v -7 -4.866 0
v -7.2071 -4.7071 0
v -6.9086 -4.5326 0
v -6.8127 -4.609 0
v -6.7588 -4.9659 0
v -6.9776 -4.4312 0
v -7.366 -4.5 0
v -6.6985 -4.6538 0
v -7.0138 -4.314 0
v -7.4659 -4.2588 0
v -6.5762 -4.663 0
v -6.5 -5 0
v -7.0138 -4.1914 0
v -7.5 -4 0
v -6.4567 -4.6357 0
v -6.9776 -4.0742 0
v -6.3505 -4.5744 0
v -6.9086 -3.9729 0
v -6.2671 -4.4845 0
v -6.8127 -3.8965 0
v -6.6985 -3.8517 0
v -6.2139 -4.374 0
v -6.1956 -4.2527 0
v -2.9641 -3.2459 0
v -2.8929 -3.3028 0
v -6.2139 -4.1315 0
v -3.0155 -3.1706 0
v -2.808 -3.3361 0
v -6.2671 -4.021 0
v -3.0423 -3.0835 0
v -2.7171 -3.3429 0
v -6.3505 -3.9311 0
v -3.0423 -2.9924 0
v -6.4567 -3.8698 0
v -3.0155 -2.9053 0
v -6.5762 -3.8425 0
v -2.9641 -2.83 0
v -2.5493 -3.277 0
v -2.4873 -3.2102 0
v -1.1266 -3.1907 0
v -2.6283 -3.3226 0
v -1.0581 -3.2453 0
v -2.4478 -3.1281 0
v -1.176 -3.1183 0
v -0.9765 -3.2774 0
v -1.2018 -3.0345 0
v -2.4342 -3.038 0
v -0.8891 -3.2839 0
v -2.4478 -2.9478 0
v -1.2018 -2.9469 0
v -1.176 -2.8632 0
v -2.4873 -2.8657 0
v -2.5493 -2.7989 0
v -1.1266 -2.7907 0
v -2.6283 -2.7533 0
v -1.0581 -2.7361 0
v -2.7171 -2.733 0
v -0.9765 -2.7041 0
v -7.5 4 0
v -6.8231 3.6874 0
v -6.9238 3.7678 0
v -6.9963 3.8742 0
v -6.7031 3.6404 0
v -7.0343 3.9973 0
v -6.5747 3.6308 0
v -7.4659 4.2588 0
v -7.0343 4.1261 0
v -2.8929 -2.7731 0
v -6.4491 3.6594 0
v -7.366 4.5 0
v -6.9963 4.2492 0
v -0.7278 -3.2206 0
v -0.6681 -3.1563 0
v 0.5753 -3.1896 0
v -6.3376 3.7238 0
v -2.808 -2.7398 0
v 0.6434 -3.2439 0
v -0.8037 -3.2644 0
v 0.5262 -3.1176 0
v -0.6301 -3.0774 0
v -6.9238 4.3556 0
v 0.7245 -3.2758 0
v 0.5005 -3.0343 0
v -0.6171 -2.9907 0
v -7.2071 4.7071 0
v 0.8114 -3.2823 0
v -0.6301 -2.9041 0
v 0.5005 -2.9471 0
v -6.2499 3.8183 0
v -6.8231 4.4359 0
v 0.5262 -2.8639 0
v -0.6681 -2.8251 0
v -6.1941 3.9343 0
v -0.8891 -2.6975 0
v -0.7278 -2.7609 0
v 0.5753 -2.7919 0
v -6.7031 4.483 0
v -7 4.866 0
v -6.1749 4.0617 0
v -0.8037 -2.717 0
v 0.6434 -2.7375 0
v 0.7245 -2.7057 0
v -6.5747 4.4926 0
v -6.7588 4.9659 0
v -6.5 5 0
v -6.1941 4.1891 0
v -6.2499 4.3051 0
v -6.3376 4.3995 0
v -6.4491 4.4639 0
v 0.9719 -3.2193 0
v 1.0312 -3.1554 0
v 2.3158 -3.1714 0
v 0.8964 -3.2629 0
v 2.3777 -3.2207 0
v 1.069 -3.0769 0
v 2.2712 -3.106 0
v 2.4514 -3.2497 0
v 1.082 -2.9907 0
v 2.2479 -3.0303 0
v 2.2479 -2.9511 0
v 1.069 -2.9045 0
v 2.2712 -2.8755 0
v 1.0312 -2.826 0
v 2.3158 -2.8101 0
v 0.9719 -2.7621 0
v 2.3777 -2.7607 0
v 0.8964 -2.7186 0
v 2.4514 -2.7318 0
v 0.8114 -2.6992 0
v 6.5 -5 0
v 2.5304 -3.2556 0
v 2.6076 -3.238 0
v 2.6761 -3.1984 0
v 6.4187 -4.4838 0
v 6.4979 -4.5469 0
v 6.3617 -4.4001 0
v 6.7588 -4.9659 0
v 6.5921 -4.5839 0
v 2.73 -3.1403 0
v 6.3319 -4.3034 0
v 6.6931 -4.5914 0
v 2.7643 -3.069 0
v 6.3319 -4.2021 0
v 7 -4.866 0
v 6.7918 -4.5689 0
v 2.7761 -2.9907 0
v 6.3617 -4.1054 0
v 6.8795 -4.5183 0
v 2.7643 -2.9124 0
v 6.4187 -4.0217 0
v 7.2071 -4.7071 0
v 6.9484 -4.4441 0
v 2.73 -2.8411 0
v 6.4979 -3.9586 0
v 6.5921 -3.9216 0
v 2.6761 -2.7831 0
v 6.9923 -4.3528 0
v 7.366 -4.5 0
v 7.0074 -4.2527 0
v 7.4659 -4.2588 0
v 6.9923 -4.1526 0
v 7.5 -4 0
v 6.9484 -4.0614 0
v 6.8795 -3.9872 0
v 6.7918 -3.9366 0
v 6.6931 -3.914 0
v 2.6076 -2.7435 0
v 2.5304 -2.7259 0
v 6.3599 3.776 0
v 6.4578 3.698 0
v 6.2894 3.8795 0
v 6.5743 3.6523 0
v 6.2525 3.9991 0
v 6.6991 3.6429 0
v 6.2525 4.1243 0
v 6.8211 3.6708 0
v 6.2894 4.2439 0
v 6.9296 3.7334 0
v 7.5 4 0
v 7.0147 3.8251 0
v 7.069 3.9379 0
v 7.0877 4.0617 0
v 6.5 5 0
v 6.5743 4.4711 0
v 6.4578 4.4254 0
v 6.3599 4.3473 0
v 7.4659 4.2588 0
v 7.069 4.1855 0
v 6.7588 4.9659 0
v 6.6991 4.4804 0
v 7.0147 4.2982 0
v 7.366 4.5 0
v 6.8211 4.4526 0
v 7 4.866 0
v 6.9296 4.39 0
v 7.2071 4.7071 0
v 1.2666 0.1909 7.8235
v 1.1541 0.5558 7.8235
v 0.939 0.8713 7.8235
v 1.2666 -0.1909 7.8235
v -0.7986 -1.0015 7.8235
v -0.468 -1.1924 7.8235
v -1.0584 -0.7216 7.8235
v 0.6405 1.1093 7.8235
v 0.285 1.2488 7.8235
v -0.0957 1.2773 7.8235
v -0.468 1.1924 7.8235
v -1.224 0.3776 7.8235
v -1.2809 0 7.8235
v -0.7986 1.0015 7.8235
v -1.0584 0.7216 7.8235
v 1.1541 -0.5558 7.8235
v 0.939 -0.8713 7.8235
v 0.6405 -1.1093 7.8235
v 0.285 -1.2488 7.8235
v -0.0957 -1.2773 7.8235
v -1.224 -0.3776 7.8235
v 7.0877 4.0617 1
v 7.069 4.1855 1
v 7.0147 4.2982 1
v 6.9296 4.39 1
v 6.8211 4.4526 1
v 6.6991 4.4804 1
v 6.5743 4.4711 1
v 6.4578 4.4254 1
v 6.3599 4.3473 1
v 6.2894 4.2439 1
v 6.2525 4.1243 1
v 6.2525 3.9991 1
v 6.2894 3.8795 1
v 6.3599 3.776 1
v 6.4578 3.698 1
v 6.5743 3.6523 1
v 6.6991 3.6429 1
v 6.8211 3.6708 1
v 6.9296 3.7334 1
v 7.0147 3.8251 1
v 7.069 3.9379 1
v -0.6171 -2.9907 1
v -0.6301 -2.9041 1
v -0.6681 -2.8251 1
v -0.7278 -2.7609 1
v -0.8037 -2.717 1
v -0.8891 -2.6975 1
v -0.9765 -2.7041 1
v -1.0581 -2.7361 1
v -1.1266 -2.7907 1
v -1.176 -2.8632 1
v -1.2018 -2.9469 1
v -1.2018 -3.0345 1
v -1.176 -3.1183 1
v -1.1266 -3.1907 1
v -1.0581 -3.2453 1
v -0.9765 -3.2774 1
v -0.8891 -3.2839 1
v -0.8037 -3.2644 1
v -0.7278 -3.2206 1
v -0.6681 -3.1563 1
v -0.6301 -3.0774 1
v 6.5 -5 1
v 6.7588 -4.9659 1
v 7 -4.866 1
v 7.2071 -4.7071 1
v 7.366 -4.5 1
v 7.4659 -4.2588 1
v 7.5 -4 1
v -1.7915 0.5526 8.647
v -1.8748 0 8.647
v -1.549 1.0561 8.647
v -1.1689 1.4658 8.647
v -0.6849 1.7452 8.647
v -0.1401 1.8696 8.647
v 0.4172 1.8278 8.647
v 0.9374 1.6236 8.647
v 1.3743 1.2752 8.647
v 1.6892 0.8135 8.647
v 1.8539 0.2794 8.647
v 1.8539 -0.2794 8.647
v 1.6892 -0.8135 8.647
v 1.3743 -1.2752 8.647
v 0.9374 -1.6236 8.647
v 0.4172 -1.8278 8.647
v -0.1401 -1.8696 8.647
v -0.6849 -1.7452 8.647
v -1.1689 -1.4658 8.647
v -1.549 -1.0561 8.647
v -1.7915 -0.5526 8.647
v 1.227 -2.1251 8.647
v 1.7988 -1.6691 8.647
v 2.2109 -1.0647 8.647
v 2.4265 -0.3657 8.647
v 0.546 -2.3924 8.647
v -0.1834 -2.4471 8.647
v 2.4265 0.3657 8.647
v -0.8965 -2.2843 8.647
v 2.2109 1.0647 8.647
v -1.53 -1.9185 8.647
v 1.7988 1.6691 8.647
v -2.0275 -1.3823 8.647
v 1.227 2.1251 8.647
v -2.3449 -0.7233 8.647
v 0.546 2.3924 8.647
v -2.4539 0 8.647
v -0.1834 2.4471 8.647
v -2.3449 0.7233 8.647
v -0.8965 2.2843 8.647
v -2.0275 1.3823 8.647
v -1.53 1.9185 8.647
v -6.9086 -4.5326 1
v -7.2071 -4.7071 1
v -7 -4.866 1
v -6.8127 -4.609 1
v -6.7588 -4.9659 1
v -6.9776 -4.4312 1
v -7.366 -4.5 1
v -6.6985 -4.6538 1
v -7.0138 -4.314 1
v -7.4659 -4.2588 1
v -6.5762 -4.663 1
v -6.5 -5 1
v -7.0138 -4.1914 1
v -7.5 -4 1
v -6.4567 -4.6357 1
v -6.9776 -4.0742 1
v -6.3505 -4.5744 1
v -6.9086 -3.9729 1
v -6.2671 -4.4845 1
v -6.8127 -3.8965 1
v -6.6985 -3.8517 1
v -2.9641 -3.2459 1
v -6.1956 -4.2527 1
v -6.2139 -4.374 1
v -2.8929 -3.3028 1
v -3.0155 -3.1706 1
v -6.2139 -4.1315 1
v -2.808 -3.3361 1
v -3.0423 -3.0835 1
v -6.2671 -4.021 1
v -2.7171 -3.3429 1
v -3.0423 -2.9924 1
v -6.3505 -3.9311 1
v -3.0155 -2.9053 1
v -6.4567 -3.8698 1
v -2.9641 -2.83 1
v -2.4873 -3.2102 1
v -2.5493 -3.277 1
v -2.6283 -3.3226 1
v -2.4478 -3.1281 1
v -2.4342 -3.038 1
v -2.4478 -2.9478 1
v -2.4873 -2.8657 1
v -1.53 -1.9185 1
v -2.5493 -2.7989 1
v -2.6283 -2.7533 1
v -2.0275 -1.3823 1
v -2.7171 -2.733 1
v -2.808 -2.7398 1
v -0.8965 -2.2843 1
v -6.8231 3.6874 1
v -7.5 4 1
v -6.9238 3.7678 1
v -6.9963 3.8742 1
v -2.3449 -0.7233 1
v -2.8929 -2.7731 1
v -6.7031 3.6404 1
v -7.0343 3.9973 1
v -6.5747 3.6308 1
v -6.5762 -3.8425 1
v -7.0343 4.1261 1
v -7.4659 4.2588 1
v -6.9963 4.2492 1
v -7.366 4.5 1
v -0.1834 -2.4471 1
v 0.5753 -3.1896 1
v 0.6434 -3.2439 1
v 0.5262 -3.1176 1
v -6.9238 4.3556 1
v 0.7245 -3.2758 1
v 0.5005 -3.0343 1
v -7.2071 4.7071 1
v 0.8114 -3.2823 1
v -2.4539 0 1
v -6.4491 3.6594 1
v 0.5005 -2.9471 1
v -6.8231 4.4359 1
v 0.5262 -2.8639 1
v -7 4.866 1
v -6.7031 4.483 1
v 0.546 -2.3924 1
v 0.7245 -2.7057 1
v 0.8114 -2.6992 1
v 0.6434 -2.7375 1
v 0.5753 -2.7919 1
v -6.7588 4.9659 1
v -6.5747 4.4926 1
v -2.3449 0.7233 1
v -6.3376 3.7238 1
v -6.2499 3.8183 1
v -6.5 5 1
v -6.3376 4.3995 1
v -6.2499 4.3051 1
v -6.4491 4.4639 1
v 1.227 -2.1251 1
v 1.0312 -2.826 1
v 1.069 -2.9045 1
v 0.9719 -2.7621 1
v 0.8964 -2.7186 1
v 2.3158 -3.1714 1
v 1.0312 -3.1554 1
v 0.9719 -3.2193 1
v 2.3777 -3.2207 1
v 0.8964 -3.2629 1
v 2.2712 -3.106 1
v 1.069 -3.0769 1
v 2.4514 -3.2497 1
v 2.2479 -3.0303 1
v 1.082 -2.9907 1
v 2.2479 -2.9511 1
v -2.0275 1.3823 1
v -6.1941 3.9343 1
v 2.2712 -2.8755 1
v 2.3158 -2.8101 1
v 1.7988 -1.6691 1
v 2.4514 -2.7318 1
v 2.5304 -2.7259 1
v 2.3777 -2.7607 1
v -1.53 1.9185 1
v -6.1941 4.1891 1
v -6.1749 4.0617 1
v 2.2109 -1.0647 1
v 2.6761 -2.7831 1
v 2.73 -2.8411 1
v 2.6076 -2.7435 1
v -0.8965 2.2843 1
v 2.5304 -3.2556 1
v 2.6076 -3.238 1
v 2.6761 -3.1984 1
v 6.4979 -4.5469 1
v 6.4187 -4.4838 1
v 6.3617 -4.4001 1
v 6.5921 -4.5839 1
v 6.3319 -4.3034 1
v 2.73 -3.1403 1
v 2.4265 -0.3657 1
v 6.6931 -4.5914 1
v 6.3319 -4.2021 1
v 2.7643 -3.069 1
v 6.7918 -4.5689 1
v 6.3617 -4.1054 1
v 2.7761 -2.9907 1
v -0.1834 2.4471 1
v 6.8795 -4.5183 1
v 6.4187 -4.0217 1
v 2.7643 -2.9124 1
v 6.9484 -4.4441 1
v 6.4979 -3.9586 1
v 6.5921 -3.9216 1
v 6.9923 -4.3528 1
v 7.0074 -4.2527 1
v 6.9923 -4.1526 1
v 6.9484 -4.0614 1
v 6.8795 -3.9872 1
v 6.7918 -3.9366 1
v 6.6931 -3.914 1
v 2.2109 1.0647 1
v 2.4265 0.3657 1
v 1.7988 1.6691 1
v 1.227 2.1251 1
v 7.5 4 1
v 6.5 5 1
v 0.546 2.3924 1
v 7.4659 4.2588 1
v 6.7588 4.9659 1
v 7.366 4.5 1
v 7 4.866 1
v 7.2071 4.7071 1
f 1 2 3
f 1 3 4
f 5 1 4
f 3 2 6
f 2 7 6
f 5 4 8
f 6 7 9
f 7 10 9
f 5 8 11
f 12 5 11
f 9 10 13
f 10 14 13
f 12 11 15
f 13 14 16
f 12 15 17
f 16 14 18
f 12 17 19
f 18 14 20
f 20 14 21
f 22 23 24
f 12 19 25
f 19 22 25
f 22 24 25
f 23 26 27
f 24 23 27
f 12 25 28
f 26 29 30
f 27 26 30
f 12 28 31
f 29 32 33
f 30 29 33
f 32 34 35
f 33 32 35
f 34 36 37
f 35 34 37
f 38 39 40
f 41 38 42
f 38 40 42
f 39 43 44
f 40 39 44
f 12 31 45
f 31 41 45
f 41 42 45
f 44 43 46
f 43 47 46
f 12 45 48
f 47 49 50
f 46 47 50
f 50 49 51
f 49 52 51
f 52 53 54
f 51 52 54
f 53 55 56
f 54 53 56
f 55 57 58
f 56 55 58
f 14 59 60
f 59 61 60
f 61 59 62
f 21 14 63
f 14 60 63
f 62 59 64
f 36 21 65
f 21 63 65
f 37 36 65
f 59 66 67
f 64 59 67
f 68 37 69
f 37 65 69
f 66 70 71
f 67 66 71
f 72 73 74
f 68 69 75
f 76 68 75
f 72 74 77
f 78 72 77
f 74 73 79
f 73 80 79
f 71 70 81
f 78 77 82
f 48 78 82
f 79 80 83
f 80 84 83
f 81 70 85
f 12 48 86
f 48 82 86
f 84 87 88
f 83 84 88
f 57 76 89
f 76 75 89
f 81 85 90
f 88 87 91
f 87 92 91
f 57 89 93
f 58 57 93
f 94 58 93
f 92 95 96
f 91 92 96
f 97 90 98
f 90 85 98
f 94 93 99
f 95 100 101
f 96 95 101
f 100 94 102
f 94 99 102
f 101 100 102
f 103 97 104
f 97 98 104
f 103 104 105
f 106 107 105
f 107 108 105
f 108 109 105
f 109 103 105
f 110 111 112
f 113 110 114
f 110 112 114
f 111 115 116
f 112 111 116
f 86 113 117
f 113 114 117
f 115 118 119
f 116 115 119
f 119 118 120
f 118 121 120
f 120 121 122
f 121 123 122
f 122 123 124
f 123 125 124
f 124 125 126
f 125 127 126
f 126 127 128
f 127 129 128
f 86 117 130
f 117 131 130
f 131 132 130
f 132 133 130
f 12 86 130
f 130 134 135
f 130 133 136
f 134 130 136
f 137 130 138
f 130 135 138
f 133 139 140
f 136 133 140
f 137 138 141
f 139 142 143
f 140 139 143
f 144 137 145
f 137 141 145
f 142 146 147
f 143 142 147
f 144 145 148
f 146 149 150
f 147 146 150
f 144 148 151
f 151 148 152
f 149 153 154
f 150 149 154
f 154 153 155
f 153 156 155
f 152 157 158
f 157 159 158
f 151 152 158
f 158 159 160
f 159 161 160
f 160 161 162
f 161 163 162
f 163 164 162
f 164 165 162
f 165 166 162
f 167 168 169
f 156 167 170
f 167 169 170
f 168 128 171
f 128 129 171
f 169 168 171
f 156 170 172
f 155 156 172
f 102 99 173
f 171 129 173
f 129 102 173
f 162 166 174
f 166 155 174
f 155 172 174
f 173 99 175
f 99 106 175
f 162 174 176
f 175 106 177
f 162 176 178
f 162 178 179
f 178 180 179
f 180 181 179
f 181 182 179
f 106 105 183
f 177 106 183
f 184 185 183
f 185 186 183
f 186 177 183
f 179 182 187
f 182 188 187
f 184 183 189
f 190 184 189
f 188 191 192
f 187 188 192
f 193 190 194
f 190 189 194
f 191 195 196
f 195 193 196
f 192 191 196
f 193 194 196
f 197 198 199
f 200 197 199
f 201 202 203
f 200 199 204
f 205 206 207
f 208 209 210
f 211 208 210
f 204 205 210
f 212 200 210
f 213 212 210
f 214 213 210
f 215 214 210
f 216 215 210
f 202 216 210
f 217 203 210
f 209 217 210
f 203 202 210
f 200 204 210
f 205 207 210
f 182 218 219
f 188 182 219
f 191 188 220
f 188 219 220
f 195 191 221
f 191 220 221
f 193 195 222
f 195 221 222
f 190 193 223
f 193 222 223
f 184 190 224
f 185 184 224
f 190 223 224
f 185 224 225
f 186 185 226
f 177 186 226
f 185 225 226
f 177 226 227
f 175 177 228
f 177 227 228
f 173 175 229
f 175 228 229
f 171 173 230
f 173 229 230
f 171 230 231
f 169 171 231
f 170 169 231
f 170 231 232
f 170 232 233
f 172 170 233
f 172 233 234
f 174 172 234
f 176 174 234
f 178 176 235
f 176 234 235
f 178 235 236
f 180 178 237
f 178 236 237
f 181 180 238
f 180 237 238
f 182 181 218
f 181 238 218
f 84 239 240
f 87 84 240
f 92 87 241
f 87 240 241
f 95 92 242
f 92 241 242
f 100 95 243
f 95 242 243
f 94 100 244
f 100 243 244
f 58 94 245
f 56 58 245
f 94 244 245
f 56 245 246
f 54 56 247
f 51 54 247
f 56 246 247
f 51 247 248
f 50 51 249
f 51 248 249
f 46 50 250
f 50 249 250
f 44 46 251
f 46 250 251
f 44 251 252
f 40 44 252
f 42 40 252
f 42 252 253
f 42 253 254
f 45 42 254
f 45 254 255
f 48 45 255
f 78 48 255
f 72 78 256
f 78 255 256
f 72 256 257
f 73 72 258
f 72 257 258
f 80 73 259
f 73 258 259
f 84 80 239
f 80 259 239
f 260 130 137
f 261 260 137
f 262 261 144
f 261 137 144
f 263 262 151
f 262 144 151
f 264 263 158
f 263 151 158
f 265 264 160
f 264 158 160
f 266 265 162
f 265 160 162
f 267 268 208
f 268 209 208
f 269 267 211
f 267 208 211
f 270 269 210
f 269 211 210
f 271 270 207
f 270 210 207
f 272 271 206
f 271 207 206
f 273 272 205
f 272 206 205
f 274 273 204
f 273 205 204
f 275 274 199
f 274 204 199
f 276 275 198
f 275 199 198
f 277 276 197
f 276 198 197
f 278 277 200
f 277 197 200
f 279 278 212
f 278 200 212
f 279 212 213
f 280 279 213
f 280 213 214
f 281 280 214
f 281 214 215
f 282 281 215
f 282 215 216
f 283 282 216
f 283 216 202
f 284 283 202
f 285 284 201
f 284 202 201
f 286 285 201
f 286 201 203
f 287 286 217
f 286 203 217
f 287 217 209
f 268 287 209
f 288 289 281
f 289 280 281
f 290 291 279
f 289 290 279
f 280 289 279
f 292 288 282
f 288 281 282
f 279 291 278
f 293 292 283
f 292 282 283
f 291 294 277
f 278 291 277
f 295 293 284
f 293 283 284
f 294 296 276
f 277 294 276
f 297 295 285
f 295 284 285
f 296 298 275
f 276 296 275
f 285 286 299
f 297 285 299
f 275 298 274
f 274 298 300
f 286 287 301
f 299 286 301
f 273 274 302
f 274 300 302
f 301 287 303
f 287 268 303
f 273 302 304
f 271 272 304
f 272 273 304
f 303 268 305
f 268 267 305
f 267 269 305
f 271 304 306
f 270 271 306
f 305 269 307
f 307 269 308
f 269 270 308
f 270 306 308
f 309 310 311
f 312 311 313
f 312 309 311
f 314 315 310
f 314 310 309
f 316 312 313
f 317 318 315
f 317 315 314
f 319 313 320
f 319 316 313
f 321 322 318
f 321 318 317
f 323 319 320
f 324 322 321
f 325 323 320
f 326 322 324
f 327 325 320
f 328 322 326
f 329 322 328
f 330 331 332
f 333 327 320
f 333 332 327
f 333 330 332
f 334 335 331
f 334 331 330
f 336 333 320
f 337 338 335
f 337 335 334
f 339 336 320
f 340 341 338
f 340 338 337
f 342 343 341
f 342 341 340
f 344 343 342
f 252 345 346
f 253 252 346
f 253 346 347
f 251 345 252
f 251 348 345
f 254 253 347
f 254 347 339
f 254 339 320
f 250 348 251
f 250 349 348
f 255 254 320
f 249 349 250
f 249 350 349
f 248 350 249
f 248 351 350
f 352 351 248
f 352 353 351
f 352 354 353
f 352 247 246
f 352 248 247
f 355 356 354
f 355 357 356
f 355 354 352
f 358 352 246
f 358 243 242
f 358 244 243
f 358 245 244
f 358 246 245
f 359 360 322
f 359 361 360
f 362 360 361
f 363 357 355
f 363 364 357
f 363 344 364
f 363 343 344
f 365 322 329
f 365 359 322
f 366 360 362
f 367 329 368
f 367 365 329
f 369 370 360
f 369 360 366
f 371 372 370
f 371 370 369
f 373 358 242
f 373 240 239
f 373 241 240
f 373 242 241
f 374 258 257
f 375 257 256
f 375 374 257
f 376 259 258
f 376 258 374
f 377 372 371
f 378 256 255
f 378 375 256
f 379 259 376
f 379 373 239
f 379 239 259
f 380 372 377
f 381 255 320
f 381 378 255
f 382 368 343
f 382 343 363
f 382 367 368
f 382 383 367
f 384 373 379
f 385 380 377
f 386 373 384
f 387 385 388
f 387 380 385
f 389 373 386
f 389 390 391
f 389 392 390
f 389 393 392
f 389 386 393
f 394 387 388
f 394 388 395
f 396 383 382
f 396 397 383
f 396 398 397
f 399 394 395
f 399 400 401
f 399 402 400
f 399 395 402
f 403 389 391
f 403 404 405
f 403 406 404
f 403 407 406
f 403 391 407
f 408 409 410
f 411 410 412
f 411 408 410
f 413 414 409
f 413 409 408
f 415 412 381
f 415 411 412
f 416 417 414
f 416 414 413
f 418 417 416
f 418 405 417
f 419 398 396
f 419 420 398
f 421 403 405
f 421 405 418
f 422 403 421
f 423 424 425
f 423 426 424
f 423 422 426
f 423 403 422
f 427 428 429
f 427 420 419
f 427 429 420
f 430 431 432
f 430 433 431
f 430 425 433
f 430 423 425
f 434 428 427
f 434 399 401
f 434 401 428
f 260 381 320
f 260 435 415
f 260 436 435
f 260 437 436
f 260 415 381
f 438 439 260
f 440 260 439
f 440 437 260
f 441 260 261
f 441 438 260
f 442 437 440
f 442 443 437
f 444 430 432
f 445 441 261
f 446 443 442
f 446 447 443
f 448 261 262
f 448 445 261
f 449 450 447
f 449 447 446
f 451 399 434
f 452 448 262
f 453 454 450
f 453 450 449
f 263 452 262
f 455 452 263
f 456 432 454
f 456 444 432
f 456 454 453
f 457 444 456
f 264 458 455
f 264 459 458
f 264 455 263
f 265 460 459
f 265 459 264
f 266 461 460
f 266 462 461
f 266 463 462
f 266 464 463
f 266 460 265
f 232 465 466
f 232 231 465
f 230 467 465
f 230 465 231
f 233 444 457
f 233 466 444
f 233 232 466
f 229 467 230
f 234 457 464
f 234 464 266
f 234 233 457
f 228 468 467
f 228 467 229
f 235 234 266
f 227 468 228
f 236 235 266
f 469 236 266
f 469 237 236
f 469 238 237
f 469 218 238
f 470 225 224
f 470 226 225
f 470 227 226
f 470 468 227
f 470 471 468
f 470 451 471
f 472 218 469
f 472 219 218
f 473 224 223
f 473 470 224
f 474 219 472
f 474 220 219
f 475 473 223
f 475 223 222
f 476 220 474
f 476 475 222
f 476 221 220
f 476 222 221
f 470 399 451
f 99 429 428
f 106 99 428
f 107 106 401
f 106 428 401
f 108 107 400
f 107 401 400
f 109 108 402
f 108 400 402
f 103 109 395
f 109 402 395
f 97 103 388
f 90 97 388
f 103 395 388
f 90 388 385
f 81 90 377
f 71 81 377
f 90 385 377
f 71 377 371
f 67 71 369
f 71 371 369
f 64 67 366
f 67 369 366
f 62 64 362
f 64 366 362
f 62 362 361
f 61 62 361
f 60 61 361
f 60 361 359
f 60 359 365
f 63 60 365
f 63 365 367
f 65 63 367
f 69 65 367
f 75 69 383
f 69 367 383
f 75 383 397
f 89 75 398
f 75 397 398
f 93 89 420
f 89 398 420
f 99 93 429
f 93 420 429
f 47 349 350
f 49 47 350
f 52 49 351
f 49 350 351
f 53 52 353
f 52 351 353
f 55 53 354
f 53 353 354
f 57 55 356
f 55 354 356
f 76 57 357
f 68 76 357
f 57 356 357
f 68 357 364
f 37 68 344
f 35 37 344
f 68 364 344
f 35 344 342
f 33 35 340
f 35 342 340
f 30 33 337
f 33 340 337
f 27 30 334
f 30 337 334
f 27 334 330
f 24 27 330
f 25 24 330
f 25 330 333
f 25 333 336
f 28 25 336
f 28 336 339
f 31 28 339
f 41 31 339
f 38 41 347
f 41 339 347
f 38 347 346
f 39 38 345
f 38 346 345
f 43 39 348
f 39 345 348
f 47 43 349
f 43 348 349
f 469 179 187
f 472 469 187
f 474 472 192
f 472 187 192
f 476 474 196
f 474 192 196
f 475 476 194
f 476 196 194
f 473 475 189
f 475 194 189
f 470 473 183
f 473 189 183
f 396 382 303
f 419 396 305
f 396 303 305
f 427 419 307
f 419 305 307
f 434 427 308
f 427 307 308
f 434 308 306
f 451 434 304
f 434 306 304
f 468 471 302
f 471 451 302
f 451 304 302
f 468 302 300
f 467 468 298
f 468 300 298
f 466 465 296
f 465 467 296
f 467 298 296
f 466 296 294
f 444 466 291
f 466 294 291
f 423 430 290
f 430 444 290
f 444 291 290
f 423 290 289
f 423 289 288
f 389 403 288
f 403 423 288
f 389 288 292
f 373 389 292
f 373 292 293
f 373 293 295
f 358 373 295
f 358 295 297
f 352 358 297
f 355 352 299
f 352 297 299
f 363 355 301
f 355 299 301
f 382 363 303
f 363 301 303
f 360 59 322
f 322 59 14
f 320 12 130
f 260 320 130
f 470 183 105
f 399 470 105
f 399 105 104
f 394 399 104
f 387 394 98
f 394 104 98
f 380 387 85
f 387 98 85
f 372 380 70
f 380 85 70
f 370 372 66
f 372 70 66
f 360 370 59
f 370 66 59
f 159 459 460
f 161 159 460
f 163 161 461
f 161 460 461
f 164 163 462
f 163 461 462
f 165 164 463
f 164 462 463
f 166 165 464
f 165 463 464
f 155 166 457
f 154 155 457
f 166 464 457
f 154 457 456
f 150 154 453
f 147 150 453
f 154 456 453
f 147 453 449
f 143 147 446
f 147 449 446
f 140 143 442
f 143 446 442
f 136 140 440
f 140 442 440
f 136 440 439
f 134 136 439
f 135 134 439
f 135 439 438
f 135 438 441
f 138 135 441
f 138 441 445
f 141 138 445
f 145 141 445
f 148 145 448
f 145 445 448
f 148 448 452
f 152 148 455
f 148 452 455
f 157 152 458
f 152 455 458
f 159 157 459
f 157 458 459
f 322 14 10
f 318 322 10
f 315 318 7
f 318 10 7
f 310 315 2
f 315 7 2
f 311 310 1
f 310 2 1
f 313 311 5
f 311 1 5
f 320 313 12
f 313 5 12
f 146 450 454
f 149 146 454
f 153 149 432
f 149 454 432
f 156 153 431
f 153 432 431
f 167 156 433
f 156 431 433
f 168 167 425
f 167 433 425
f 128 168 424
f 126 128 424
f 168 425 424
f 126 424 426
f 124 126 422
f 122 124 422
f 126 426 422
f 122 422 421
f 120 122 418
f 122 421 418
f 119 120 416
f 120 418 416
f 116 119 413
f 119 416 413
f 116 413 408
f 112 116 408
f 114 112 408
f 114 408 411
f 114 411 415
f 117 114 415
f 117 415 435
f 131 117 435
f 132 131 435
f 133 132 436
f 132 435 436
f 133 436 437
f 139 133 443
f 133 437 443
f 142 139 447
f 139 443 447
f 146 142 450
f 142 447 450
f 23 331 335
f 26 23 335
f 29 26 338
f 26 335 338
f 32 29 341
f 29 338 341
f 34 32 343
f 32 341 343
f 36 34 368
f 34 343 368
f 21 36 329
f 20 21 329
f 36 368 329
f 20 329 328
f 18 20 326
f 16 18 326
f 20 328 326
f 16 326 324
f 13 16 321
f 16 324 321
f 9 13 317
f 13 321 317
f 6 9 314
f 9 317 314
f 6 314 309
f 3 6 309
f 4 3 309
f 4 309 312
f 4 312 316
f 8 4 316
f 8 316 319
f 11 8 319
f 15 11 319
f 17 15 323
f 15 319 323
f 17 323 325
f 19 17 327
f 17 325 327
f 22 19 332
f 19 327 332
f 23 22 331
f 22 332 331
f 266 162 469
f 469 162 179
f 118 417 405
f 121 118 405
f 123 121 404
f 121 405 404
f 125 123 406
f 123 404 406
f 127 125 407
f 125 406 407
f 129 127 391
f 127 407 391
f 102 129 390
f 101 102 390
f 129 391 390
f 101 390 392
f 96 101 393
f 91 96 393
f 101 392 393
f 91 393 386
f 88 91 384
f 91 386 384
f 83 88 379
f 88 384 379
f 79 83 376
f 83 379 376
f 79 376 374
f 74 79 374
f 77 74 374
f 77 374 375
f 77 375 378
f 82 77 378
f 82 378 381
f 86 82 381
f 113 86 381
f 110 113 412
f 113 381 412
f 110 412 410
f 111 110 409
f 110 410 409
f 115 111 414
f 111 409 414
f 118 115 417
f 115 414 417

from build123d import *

# Parameters (mm, degrees)
BOSS_EXTRUDE1_DEPTH = 1
SKETCH2_R           = 0.432128273
SKETCH2_R_2         = 0.419941145
SKETCH2_R_3         = 0.339655263
SKETCH2_R_4         = 0.411394619
SKETCH2_R_5         = 0.305784332
SKETCH2_R_6         = 0.294014574
SKETCH2_R_7         = 0.29238352
SKETCH2_R_8         = 0.265611248
CUT_EXTRUDE1_DEPTH  = 1
SKETCH2_5_R         = 2.453911785
BOSS_EXTRUDE2_DEPTH = 4


with BuildPart() as part:
    # Sketch1 → Boss-Extrude1 (new body)
    with BuildSketch(Plane.XY):
        with BuildLine():
            Line((-6.5, -5), (6.5, -5))
            ThreePointArc((6.5, -5), (7.207106781, -4.707106781), (7.5, -4))
            Line((7.5, -4), (7.5, 4))
            ThreePointArc((7.5, 4), (7.207106781, 4.707106781), (6.5, 5))
            Line((6.5, 5), (-6.5, 5))
            ThreePointArc((-6.5, 5), (-7.207106781, 4.707106781), (-7.5, 4))
            Line((-7.5, 4), (-7.5, -4))
            ThreePointArc((-7.5, -4), (-7.207106781, -4.707106781), (-6.5, -5))
        make_face()
    extrude(amount=BOSS_EXTRUDE1_DEPTH)

    # Sketch2 → Cut-Extrude1 (cut)
    with BuildSketch(Plane.XY.offset(1)):
        with Locations((-6.6069869, 4.061679043)):
            Circle(SKETCH2_R)
        with Locations((6.667725288, 4.061679043)):
            Circle(SKETCH2_R_2)
        with Locations((6.667725288, -4.252731437)):
            Circle(SKETCH2_R_3)
        with Locations((-6.6069869, -4.252731437)):
            Circle(SKETCH2_R_4)
        with Locations((-2.739976181, -3.037963672)):
            Circle(SKETCH2_R_5)
        with Locations((-0.911075824, -2.990722704)):
            Circle(SKETCH2_R_6)
        with Locations((0.789599047, -2.990722704)):
            Circle(SKETCH2_R_7)
        with Locations((2.510520048, -2.990722704)):
            Circle(SKETCH2_R_8)
    extrude(amount=-CUT_EXTRUDE1_DEPTH, mode=Mode.SUBTRACT)

    # Sketch2<5> → Boss-Extrude2 (add)
    with BuildSketch(Plane.XY.offset(1)):
        Circle(SKETCH2_5_R)
    extrude(amount=BOSS_EXTRUDE2_DEPTH)

    # Sketch6 → Revolve1 (revolve)
    with BuildSketch(Plane(origin=(0, 0, 0), x_dir=(0, 0, -1), z_dir=(1, 0, 0))):
        Polygon((-5, 2.453911785), (-8.647016012, 2.453911785), (-8.647016012, 1.874818049), (-7.823508006, 1.280931587), (-7.823508006, 0), (-5, 0), align=None)
    revolve(axis=Axis((0, 0, 7.823508006), (0, 0, -1)))


solid = part.part
